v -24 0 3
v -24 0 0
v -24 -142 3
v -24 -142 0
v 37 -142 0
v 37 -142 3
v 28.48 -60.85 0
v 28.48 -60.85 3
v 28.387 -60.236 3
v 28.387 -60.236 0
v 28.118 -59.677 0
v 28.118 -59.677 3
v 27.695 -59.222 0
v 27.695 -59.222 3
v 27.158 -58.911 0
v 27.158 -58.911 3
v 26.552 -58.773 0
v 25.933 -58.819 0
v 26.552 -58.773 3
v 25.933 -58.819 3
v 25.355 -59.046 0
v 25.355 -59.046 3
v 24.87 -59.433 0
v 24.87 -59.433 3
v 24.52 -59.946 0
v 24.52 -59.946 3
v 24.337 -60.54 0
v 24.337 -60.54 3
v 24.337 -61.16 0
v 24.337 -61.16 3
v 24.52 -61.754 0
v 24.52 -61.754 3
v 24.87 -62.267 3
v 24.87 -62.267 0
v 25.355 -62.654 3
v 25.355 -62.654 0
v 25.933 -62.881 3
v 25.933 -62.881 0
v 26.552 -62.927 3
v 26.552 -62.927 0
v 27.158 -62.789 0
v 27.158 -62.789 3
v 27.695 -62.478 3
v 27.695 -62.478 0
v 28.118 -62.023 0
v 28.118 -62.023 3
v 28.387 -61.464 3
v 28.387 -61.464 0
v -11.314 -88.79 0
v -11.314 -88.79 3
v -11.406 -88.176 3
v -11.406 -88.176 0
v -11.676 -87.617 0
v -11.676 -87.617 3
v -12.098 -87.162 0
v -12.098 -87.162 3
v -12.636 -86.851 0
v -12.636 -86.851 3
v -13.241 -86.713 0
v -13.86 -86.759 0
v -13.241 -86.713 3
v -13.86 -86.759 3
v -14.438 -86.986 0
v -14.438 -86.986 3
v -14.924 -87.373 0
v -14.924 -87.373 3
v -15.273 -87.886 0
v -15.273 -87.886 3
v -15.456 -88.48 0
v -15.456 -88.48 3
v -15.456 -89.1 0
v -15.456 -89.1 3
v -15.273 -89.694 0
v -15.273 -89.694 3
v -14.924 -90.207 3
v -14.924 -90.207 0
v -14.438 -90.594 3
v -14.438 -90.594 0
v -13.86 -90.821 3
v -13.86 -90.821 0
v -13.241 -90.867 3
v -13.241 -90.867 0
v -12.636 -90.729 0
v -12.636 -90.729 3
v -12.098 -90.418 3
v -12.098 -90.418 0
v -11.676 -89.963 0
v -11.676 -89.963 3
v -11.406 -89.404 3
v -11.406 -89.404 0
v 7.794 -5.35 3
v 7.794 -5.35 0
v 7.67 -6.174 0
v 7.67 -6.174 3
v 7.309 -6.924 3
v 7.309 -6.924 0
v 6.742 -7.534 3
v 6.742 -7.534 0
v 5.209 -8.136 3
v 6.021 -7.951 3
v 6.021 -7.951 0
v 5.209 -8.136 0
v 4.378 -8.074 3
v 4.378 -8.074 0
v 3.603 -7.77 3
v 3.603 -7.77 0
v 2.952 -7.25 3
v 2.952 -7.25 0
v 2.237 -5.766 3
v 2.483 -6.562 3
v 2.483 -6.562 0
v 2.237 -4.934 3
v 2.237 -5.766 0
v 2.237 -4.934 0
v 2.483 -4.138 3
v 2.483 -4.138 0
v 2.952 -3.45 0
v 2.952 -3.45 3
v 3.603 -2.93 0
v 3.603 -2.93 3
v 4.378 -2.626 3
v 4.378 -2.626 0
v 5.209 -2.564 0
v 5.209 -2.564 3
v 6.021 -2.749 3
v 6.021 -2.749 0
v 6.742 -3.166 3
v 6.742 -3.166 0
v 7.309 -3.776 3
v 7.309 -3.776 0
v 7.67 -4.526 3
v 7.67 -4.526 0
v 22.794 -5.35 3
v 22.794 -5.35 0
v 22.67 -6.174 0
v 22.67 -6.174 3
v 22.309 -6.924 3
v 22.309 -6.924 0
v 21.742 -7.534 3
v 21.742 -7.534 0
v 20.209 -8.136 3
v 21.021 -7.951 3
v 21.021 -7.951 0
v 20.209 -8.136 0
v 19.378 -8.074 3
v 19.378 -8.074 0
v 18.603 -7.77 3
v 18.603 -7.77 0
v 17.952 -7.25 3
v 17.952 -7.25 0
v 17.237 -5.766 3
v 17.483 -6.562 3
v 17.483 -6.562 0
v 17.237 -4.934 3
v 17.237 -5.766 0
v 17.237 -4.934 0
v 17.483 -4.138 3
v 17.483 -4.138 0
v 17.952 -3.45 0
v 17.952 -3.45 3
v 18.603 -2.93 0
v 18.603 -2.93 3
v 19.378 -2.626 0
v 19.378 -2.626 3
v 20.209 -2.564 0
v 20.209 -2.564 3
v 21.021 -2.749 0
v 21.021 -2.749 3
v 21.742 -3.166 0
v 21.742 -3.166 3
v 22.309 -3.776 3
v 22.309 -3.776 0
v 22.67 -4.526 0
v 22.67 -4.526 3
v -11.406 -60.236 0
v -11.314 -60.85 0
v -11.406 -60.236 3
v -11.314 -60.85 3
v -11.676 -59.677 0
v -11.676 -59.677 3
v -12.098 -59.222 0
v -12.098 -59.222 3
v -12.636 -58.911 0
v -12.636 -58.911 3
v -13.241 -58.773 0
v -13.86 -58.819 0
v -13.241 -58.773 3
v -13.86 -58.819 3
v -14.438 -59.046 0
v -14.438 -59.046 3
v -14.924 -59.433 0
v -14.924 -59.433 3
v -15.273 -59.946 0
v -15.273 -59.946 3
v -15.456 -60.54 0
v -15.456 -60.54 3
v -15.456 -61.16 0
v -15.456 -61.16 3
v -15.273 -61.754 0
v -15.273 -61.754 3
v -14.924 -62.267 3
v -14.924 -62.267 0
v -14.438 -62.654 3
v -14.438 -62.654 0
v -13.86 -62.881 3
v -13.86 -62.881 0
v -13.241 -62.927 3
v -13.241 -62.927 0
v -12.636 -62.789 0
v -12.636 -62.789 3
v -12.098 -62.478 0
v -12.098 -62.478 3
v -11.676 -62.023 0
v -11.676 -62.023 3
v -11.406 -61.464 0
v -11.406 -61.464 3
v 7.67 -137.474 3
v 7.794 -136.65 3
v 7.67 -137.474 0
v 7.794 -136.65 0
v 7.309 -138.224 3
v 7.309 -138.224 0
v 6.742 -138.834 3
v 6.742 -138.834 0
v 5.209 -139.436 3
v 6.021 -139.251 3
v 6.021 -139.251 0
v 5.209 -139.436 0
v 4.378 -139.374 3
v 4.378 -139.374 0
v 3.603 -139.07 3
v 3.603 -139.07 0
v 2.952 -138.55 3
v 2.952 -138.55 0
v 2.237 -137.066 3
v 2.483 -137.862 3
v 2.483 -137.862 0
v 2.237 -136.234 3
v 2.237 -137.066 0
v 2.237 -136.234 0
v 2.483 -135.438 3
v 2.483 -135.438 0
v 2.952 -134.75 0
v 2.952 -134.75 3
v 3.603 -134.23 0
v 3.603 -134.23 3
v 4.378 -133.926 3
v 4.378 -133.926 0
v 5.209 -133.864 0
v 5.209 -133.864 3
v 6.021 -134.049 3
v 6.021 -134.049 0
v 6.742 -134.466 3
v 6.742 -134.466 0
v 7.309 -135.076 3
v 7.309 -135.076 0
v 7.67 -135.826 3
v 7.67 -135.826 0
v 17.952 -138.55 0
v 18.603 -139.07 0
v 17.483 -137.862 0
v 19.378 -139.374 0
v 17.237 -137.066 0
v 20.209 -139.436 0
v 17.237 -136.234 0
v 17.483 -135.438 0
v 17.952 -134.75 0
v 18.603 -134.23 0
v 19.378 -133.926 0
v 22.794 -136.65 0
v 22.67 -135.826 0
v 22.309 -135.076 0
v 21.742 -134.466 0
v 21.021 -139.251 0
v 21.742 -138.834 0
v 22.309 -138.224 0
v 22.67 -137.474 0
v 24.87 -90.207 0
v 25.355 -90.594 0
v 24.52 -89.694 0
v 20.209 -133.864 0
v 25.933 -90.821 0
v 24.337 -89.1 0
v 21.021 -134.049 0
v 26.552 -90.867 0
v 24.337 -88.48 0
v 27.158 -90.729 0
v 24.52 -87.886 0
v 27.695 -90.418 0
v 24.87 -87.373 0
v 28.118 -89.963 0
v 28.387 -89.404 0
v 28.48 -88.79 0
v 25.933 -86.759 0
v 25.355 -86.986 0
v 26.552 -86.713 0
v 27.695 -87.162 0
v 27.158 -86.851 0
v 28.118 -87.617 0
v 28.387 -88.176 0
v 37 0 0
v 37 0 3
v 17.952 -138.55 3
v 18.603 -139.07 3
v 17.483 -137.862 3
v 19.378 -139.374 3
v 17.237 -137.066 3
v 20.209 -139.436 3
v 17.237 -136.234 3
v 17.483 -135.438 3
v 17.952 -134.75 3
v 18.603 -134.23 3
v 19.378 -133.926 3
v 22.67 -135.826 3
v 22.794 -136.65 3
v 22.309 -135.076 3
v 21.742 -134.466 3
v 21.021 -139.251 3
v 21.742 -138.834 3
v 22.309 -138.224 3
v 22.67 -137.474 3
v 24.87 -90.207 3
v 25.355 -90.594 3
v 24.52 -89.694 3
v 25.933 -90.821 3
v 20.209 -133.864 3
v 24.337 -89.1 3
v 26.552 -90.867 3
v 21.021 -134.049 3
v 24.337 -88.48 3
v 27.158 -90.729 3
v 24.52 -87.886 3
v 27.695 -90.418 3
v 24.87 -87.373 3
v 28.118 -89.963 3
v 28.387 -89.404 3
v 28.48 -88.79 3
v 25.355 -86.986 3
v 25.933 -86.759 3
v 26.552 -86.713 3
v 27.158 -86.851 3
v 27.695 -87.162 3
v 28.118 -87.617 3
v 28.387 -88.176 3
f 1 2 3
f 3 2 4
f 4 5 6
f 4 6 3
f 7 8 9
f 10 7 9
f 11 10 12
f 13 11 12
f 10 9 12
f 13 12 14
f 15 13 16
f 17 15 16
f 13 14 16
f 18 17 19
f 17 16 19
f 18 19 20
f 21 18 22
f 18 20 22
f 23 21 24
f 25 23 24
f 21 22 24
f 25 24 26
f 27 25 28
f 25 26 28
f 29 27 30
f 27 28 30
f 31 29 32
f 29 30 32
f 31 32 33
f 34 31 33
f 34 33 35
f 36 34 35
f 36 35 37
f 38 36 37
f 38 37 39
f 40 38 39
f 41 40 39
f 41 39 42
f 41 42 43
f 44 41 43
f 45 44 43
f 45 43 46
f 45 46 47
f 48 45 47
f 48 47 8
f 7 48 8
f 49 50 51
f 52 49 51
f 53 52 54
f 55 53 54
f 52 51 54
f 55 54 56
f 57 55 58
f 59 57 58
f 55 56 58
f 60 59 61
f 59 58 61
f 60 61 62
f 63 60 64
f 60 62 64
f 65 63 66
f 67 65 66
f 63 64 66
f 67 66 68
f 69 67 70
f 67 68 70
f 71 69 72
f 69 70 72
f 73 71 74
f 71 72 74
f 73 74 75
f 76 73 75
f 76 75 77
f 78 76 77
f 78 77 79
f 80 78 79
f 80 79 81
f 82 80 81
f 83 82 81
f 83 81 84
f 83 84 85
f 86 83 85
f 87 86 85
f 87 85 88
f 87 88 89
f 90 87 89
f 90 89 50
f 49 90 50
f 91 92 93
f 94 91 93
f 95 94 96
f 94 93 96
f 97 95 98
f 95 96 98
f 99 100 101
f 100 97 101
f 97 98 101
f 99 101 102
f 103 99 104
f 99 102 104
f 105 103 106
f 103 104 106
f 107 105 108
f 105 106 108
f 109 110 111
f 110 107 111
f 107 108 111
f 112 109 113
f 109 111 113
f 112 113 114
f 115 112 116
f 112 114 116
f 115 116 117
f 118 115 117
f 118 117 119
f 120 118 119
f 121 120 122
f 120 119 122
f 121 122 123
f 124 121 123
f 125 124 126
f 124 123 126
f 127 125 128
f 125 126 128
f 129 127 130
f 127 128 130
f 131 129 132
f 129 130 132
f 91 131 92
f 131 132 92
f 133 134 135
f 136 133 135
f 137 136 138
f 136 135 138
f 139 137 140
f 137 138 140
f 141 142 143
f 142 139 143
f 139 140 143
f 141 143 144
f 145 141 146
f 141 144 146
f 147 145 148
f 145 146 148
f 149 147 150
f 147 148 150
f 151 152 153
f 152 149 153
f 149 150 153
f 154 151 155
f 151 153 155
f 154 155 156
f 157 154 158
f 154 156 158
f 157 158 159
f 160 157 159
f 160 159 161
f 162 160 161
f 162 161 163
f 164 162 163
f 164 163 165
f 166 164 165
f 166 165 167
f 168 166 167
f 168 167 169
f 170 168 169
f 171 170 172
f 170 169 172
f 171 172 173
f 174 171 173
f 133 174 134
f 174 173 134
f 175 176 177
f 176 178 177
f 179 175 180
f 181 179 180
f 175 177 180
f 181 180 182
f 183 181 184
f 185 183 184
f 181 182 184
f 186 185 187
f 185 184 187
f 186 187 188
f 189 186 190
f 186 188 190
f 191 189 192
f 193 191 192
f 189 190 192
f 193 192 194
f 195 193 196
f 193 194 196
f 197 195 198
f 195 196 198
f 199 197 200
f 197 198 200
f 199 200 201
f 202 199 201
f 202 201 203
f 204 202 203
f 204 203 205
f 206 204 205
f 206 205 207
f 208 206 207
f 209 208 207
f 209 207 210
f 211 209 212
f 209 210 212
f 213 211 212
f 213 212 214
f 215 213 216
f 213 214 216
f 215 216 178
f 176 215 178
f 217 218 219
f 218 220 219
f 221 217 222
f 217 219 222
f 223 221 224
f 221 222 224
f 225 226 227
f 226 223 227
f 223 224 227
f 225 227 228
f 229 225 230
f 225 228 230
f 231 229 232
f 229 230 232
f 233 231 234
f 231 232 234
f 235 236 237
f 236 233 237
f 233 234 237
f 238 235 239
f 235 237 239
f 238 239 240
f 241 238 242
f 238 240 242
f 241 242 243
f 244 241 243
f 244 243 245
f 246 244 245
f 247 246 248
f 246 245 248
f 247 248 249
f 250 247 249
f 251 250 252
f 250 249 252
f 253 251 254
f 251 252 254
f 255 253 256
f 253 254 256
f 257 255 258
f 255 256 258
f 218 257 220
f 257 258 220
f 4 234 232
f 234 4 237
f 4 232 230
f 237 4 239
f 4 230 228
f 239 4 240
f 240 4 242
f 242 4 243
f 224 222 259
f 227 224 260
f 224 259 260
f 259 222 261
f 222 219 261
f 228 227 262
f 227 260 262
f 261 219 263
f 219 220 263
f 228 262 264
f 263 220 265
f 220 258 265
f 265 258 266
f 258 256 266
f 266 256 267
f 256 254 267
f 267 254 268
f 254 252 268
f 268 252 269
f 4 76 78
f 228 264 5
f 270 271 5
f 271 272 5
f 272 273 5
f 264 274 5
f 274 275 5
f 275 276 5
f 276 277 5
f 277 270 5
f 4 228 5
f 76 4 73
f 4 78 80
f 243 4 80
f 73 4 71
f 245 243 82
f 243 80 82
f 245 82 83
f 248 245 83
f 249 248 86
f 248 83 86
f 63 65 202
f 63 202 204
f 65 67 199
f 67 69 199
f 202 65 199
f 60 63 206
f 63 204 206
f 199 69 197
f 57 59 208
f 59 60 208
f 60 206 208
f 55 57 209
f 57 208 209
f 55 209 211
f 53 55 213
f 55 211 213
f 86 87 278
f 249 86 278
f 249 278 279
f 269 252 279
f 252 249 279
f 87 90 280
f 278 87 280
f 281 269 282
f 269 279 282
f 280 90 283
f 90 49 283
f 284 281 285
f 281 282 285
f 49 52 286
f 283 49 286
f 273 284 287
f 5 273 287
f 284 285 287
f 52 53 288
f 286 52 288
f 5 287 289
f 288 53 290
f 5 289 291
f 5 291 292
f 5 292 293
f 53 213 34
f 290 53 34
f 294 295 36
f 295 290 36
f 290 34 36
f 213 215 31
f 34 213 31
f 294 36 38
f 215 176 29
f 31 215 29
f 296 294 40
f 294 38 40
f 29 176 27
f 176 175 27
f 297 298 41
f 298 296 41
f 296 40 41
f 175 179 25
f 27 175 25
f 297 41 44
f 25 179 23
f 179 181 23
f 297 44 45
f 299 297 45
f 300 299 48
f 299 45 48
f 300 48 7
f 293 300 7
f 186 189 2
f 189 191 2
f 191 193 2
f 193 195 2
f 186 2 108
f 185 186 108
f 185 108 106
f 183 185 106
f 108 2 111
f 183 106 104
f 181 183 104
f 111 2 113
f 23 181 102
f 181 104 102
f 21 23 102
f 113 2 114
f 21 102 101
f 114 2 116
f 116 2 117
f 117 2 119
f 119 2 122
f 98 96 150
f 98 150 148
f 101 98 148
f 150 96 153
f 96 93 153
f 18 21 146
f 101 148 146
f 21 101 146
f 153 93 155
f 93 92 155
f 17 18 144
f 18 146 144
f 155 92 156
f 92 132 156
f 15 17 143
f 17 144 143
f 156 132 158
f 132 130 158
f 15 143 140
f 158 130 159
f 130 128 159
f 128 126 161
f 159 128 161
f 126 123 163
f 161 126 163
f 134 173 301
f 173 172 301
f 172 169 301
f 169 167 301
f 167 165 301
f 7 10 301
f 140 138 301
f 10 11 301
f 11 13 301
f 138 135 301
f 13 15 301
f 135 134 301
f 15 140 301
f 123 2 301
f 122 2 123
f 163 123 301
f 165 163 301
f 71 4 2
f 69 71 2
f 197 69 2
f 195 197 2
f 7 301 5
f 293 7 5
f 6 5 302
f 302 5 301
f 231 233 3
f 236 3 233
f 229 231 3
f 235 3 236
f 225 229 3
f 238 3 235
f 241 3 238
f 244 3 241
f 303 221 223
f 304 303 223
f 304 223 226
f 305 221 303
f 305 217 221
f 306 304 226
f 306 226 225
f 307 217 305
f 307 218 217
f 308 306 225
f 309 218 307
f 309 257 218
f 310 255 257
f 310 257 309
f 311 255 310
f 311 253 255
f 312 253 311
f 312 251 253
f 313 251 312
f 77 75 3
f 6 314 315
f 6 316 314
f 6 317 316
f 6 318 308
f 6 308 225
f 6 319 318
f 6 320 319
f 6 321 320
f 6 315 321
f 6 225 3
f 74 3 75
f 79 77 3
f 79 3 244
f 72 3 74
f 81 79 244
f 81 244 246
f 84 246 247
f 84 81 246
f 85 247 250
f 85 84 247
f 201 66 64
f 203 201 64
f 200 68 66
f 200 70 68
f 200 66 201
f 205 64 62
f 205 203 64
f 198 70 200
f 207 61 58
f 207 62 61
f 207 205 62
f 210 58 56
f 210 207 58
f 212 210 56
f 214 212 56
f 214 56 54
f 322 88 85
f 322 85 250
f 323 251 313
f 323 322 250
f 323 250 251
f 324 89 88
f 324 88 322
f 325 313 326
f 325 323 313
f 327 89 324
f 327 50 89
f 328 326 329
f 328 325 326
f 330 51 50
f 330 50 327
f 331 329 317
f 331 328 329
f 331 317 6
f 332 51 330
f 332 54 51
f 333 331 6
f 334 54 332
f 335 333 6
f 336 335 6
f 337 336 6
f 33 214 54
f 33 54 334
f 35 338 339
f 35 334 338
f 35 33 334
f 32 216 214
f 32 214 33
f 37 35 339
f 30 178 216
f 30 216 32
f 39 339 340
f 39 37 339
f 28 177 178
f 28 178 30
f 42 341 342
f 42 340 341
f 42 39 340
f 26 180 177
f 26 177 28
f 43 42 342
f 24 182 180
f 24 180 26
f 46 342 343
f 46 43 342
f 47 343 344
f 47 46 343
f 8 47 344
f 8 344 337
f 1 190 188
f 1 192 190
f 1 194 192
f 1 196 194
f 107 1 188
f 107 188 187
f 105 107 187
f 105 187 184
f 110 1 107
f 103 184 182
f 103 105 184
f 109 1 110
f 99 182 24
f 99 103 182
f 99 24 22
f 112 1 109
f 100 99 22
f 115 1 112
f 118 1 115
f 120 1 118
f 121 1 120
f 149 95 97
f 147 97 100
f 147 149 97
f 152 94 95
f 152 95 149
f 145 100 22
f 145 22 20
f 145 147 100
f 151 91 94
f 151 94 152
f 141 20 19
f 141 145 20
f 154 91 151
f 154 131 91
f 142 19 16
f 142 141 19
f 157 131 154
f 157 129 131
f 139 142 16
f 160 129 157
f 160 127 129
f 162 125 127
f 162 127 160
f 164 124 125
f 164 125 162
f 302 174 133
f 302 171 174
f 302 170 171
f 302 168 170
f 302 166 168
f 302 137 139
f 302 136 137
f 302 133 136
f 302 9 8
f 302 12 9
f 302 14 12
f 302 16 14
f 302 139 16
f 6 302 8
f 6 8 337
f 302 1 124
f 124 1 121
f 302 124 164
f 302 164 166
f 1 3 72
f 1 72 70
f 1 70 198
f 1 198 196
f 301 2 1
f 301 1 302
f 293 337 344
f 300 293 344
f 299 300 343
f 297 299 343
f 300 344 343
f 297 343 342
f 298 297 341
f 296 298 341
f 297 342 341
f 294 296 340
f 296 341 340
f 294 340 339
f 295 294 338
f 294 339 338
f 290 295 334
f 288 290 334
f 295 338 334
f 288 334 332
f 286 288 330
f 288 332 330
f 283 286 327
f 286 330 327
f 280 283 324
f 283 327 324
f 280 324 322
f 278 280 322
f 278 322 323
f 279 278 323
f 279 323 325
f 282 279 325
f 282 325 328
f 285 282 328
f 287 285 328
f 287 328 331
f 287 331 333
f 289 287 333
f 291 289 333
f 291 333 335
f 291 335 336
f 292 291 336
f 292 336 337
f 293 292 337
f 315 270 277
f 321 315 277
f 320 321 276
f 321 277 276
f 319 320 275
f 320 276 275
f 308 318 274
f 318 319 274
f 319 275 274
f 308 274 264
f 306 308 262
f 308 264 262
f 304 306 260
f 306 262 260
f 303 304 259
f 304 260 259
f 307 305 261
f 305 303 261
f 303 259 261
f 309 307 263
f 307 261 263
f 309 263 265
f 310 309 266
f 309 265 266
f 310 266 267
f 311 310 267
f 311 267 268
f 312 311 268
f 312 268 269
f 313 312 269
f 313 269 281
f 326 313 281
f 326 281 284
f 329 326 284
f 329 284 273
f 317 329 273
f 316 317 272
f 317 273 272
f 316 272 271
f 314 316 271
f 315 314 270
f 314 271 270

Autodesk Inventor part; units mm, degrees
ref_plane "YZ Plane" through (0, 0, 0) normal (1, 0, 0) x (0, 1, 0)
ref_plane "XZ Plane" through (0, 0, 0) normal (0, 1, 0) x (-1, 0, 0)
ref_plane "XY Plane" through (0, 0, 0) normal (0, 0, 1) x (1, 0, 0)
sketch "Sketch1" plane through (0, 0, 0) normal (0, 0, 1) x (1, 0, 0)
  line L0 (0, 0) -> (25, 0)
  line L1 (25, 0) -> (25, -142)
  line L2 (25, -142) -> (0, -142)
  line L3 (0, -142) -> (0, 0)
  line L4 (20, -5.35) -> (5, -5.35) construction
  line L5 (5, -5.35) -> (5, -136.65) construction
  line L6 (5, -136.65) -> (20, -136.65) construction
  line L7 (20, -136.65) -> (20, -5.35) construction
  circle A0 centre (20, -5.35) radius 2.794
  circle A1 centre (5, -5.35) radius 2.794
  circle A2 centre (20, -136.65) radius 2.794
  circle A3 centre (5, -136.65) radius 2.794
  line L8 (0, 0) -> (-24, 0)
  line L9 (-24, 0) -> (-24, -142)
  line L10 (-24, -142) -> (0, -142)
  line L11 (25, -142) -> (37, -142)
  line L12 (37, -142) -> (37, 0)
  line L13 (37, 0) -> (25, 0)
  point P0 (20, -71)
  point P1 (25, -71)
  point P2 (12.5, -136.65)
  point P3 (12.5, -142)
  dimension "d0" = 142
  dimension "d1" = 25
  dimension "d2" = 131.3
  dimension "d3" = 15
  dimension "d4" = 5.588
  dimension "d7" = 12
  dimension "d8" = 24
extrude "Extrusion1" add sketch "Sketch1" along normal blind 3
sketch "Sketch2" plane through (0, 0, 3) normal (0, 0, 1) x (1, 0, 0)
  line L0 (26.3967, -88.79) -> (-13.3967, -88.79) construction
  line L1 (-13.3967, -88.79) -> (-13.3967, -60.85) construction
  line L2 (-13.3967, -60.85) -> (26.3967, -60.85) construction
  line L3 (26.3967, -60.85) -> (26.3967, -88.79) construction
  line L4 (-24, -142) -> (37, -142) construction
  circle A0 centre (26.3967, -60.85) radius 2.0828
  circle A1 centre (26.3967, -88.79) radius 2.0828
  circle A2 centre (-13.3967, -60.85) radius 2.0828
  circle A3 centre (-13.3967, -88.79) radius 2.0828
  point P0 (0, 0)
  point P1 (6.5, -88.79)
  point P2 (6.5, -142)
  dimension "d9" = 53.21
  dimension "d10" = 27.94
  dimension "d11" = 39.7933
  dimension "d12" = 4.1656
extrude "Extrusion2" cut sketch "Sketch2" against normal blind 3
properties part number "Watercooler_Mounting_Plate"
